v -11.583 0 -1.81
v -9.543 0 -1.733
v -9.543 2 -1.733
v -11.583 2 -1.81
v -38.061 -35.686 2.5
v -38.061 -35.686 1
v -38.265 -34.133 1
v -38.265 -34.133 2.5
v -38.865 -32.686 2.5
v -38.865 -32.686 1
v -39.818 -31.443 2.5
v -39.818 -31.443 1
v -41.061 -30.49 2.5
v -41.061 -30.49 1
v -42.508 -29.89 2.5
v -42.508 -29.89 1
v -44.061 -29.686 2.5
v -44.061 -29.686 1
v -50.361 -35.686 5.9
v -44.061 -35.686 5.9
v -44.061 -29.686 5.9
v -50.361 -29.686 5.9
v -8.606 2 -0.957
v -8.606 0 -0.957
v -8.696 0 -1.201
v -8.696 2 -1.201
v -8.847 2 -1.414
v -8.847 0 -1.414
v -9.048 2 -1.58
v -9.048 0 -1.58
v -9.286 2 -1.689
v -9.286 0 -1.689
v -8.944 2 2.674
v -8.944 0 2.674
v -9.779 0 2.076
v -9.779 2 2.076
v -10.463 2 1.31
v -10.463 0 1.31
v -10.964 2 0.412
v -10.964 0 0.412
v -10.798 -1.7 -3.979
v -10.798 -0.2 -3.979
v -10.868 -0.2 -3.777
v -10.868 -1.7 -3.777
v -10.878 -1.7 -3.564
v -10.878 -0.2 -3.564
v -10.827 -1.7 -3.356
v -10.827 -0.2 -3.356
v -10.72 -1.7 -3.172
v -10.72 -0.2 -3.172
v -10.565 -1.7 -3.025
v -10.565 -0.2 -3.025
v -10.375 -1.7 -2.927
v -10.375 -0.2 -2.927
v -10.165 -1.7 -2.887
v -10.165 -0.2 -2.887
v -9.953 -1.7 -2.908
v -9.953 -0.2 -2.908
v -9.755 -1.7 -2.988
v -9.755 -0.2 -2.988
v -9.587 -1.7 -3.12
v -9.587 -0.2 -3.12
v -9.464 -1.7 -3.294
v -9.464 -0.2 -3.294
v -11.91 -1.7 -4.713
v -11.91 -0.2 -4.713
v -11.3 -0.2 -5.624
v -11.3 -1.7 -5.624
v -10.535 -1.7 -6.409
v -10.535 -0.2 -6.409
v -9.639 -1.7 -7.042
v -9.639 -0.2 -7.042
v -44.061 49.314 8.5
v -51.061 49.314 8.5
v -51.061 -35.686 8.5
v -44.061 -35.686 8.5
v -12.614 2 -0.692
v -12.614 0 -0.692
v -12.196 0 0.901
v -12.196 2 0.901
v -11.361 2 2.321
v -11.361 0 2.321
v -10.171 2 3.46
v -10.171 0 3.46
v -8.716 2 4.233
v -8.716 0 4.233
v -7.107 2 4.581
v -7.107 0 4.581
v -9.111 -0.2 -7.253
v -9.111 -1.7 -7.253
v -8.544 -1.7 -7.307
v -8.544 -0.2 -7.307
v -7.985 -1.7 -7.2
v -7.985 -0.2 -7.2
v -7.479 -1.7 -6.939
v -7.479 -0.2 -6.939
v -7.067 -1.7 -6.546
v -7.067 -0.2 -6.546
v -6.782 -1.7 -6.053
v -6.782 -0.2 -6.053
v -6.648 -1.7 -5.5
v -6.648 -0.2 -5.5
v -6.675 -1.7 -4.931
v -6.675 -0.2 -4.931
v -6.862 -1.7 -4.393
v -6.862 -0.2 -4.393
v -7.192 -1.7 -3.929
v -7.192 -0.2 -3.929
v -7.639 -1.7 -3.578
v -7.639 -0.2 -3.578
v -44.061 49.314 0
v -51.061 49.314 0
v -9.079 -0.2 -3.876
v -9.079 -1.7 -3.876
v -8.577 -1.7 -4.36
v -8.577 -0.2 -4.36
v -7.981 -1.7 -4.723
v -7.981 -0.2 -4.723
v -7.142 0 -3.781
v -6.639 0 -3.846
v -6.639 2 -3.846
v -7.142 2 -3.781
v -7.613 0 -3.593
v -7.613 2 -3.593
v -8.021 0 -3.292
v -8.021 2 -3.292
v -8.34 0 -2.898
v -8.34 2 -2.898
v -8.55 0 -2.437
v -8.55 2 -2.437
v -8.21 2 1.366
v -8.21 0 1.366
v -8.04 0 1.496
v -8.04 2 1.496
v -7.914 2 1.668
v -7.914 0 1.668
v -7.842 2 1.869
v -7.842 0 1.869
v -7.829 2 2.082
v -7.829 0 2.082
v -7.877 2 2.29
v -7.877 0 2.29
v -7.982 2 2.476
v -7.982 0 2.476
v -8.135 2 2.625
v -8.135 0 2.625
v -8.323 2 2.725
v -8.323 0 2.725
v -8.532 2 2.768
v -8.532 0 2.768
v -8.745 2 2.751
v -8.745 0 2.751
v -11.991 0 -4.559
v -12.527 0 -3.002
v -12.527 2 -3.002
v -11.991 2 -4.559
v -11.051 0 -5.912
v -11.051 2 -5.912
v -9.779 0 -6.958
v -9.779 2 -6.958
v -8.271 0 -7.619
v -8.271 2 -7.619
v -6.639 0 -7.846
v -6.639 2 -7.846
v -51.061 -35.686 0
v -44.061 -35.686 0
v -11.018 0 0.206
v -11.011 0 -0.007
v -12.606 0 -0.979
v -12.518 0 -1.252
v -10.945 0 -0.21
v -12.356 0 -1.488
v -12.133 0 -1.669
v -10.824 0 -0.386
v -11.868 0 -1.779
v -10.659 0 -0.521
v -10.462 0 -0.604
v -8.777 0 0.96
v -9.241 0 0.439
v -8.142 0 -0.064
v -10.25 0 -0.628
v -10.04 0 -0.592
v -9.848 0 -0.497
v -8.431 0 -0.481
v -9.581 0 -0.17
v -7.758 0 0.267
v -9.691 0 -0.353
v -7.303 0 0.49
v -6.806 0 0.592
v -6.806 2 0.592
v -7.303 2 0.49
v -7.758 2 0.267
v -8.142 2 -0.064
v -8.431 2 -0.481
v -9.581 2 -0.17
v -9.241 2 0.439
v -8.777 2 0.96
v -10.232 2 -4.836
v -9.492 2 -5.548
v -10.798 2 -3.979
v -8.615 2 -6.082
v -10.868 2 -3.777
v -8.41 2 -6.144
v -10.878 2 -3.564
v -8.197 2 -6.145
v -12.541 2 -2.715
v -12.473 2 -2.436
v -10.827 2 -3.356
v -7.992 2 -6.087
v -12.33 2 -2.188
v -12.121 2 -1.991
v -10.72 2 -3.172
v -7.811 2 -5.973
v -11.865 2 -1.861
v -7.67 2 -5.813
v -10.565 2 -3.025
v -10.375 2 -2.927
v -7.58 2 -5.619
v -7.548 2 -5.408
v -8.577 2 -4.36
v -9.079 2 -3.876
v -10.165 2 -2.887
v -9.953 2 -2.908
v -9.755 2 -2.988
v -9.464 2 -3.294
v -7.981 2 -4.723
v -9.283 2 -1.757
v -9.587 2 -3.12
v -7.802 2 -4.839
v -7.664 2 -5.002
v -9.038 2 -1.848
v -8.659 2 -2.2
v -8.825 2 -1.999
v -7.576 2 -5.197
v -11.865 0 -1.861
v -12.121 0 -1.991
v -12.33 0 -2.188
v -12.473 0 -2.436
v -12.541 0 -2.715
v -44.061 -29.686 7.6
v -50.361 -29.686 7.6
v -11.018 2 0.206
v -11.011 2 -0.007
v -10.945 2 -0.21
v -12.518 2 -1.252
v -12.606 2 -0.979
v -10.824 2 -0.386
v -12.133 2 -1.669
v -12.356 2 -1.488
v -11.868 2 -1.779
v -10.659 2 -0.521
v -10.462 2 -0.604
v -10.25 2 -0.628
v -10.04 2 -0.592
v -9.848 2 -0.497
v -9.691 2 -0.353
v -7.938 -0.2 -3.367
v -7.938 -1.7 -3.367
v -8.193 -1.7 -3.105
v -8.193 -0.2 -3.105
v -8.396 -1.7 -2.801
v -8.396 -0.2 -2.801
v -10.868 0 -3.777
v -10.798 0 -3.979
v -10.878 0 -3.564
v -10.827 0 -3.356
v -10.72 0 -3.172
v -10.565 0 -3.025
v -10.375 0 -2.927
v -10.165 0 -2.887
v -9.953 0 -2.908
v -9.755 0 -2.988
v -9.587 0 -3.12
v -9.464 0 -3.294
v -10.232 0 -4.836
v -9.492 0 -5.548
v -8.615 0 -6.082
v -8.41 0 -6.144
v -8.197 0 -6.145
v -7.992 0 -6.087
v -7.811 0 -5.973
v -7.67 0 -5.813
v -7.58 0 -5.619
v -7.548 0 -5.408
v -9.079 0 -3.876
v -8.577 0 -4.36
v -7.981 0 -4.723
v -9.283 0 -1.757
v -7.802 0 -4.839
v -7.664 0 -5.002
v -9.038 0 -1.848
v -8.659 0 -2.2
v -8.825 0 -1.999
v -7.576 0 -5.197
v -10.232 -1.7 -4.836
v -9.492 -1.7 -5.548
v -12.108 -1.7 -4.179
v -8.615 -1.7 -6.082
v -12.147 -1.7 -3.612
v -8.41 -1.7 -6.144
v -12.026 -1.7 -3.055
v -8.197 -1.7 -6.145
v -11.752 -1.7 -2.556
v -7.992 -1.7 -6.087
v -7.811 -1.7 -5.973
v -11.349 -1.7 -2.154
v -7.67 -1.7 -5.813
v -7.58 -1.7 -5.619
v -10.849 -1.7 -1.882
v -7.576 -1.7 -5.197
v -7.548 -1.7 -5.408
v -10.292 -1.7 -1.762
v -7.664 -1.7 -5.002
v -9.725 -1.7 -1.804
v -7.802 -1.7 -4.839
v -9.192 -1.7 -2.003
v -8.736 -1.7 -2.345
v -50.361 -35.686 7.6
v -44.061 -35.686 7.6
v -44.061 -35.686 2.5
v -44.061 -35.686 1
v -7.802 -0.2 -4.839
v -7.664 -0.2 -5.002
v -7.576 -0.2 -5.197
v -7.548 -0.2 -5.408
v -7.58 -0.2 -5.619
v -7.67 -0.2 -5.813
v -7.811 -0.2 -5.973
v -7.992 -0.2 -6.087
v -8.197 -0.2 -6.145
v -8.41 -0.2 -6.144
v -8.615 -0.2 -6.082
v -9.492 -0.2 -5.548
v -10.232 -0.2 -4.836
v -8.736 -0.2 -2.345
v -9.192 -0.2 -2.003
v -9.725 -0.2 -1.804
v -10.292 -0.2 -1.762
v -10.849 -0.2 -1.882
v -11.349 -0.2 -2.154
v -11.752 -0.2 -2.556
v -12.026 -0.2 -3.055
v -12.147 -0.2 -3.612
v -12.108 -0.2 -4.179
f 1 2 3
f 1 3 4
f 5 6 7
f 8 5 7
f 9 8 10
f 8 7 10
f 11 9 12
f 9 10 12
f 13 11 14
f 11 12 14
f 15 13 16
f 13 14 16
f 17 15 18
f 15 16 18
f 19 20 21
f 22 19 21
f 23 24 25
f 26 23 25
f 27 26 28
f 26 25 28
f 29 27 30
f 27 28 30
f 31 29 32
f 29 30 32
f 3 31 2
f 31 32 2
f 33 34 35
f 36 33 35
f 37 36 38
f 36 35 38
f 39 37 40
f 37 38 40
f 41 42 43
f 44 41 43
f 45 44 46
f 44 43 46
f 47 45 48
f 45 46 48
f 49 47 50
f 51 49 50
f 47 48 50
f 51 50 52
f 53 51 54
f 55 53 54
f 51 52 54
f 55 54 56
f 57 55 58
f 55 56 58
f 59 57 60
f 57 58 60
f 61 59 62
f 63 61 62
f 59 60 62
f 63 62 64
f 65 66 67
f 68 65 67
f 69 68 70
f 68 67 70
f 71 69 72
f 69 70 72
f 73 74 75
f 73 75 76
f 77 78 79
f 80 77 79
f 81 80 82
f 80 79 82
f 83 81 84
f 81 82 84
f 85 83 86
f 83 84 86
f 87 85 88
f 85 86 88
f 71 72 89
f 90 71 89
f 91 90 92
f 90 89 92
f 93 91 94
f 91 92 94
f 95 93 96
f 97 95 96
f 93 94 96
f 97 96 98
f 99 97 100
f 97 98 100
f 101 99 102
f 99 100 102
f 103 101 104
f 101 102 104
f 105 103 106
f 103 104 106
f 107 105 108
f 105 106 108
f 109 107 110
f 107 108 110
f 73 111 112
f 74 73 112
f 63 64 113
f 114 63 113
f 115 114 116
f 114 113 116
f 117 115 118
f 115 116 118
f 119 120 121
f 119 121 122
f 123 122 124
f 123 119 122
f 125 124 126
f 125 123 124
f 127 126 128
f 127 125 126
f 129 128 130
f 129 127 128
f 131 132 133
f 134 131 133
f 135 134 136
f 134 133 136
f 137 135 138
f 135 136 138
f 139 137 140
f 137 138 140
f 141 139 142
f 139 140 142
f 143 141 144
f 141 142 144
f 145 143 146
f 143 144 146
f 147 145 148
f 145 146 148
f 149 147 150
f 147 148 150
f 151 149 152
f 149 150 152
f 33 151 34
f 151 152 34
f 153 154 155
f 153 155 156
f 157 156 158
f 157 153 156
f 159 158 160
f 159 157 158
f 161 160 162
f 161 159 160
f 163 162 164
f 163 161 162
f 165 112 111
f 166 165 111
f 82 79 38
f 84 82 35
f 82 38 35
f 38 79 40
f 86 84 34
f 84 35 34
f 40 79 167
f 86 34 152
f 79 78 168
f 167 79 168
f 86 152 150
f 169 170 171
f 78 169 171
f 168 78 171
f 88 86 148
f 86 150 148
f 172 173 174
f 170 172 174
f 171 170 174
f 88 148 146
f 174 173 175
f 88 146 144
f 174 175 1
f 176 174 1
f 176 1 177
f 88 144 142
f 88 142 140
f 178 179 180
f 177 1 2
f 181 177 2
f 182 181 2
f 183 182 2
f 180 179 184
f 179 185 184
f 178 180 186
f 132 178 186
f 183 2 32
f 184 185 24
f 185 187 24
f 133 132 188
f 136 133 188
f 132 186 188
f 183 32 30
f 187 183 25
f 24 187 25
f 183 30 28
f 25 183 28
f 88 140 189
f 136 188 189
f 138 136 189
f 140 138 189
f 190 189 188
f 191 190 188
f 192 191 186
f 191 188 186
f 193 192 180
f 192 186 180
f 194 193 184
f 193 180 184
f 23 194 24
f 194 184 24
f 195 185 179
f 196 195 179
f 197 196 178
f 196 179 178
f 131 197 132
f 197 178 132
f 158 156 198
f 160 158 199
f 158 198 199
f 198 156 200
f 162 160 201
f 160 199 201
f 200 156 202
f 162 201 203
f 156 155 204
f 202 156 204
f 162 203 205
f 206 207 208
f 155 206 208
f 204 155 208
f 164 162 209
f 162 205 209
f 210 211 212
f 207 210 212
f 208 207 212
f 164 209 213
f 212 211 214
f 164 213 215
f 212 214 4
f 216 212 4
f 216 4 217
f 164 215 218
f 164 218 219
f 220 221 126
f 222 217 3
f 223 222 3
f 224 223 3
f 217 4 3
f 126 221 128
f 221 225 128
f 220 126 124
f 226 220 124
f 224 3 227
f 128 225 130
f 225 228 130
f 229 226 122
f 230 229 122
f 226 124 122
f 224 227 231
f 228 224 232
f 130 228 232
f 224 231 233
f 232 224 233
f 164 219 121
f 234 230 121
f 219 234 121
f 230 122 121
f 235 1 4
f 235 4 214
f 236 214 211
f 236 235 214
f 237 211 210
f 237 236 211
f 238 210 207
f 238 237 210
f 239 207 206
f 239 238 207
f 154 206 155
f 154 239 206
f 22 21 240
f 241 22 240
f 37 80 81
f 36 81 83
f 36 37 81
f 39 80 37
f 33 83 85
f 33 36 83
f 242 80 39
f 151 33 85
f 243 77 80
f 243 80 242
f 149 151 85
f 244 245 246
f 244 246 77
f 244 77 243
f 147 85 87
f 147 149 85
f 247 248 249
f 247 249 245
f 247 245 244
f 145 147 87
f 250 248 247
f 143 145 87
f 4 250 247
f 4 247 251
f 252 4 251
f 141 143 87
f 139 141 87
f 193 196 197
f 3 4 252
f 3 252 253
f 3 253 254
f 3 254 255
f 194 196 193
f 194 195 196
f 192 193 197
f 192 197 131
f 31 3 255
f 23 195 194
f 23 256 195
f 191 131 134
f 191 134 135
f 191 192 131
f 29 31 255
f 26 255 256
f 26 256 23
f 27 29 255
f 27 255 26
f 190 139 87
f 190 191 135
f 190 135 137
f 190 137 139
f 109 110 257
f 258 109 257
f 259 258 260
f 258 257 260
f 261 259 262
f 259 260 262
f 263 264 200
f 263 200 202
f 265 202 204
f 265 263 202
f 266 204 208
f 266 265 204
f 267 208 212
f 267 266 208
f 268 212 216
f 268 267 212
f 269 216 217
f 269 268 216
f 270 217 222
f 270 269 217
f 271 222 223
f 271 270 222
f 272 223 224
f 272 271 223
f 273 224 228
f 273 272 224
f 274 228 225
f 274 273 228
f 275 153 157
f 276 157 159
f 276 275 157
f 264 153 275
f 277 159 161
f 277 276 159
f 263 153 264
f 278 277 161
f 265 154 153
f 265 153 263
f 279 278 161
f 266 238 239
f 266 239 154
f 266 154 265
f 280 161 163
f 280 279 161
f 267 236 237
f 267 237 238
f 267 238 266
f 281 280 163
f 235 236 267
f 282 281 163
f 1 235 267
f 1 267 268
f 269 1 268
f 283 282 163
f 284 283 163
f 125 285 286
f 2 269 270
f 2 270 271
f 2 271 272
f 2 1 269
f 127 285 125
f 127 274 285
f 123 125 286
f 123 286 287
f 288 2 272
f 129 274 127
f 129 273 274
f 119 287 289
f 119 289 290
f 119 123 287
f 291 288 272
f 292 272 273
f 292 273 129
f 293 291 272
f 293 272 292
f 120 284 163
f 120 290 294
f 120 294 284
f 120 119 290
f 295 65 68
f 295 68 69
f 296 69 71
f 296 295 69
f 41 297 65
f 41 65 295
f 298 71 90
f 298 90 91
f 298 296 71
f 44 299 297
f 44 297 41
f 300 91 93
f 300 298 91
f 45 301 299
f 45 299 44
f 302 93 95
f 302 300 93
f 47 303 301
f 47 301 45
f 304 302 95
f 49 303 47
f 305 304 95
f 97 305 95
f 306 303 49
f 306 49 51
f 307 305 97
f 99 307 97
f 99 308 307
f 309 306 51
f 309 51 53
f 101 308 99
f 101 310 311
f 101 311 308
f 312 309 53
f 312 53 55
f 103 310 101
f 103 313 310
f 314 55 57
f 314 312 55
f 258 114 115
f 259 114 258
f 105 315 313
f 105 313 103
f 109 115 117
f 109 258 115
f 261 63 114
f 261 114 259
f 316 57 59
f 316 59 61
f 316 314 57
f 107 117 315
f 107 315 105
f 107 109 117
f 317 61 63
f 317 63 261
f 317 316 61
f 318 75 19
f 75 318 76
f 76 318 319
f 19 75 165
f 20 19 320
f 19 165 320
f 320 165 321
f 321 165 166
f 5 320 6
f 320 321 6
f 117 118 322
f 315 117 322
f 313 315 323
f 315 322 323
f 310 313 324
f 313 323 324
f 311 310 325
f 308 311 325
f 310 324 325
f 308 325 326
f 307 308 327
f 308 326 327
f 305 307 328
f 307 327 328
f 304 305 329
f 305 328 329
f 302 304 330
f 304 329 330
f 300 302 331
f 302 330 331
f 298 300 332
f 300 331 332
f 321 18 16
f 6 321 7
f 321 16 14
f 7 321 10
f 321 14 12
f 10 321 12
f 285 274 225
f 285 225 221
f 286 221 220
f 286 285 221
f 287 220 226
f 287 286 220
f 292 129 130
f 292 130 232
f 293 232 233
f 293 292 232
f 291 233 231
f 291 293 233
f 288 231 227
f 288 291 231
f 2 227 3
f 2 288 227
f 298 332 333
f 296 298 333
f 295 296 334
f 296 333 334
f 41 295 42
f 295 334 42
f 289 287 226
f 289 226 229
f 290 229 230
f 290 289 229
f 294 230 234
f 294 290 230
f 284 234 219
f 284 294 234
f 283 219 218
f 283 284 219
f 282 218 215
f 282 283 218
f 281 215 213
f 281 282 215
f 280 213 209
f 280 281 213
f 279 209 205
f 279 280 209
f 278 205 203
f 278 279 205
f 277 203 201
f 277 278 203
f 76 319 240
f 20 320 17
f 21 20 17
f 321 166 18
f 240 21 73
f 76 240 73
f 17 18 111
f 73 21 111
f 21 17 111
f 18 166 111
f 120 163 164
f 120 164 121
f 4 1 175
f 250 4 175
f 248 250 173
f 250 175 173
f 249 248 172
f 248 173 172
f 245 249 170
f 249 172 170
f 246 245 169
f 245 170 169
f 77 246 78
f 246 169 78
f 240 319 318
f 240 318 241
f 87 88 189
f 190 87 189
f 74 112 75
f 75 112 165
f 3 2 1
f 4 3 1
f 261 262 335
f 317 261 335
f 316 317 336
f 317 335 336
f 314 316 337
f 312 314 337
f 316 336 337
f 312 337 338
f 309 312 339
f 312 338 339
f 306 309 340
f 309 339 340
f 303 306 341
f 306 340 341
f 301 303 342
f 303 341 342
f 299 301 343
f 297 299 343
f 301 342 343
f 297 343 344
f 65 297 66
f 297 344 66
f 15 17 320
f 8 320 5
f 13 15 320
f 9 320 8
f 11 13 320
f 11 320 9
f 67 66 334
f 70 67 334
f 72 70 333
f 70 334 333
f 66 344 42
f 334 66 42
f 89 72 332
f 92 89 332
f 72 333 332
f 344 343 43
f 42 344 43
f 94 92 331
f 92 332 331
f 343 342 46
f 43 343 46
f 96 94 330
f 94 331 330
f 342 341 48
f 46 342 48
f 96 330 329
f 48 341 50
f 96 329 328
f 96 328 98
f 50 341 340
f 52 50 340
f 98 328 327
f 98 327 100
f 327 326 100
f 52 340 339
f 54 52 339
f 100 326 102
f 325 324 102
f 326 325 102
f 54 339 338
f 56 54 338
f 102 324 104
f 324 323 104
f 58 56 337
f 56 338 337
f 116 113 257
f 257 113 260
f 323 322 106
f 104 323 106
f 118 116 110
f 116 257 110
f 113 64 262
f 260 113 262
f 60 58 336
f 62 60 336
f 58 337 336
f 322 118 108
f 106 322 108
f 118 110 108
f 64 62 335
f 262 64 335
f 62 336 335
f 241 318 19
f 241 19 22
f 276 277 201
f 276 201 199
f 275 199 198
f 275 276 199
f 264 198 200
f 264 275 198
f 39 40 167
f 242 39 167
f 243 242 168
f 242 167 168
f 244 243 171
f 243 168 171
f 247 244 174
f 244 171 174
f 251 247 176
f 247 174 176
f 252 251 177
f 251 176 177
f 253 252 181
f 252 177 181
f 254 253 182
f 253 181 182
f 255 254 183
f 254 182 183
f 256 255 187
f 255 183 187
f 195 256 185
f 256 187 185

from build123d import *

# Parameters (mm, degrees)
F1_DEPTH  = 8.5
F4_DEPTH  = 1.5
F5_W      = 6
F5_H      = 1.7
F6_DEPTH  = 6.3
F8_DEPTH  = 2
F11_DEPTH = 1.5


with BuildPart() as f1:
    # F0 (on Top) → F1 (new body)
    with BuildSketch(Plane.XY):
        Polygon((-44.0608784556, 49.3143303692), (-51.0608784556, 49.3143303692), (-51.0608784556, -35.6856696308), (-44.0608784556, -35.6856696308), (-44.0608784556, -29.6856696308), align=None)
    extrude(amount=F1_DEPTH)

    # F3 (on offset) → F4 (join)
    with BuildSketch(Plane.XY.offset(1)):
        with BuildLine():
            ThreePointArc((-38.0608784556, -35.6856696308), (-39.8182377685, -31.4430289436), (-44.0608784556, -29.6856696308))
            Line((-44.0608784556, -29.6856696308), (-44.0608784556, -35.6856696308))
            Line((-44.0608784556, -35.6856696308), (-38.0608784556, -35.6856696308))
        make_face()
    extrude(amount=F4_DEPTH)

    # F5 (on face) → F6 (cut)
    with BuildSketch(Plane.YZ.offset(-44.0608784556)):
        with Locations((-32.6856696308, 6.75)):
            Rectangle(F5_W, F5_H)
    extrude(amount=-F6_DEPTH, mode=Mode.SUBTRACT)


with BuildPart() as f8:
    # F7 (on Front) → F8 (new body)
    with BuildSketch(Plane.XZ):
        with BuildLine():
            ThreePointArc((-11.5830838789, -1.8096130051), (-12.3295300446, -2.1881894299), (-12.5267582762, -3.001579258))
            ThreePointArc((-12.5267582762, -3.001579258), (-10.4512512978, -6.4789110558), (-6.6391801015, -7.8455415266))
            Line((-6.6391801015, -7.8455415266), (-6.6391801015, -3.8455415266))
            ThreePointArc((-6.6391801015, -3.8455415266), (-7.8261601413, -3.4552242235), (-8.5498413333, -2.4366199115))
            ThreePointArc((-8.5498413333, -2.4366199115), (-8.9269159095, -1.9163037538), (-9.542760581, -1.7328658064))
            Line((-9.542760581, -1.7328658064), (-11.5830838789, -1.8096130051))
        make_face()
        with BuildLine():
            ThreePointArc((-8.6146861663, -6.0820279542), (-9.8817958098, -5.2124221053), (-10.798416024, -3.9788952253))
            ThreePointArc((-10.798416024, -3.9788952253), (-10.4733696324, -2.9692691345), (-9.4637435416, -3.294315526))
            ThreePointArc((-9.4637435416, -3.294315526), (-8.8412609525, -4.1320114377), (-7.9807587737, -4.7225662736))
            ThreePointArc((-7.9807587737, -4.7225662736), (-7.6179916297, -5.7192608102), (-8.6146861663, -6.0820279542))
        make_face(mode=Mode.SUBTRACT)
    extrude(amount=-F8_DEPTH)


with BuildPart() as f11:
    # F10 (on offset) → F11 (new body)
    with BuildSketch(Plane.XZ.offset(0.2)):
        with BuildLine():
            ThreePointArc((-7.6391801015, -3.5775923341), (-8.0711782653, -3.2417439684), (-8.3959854459, -2.8013840772))
            ThreePointArc((-8.3959854459, -2.8013840772), (-11.1086333411, -2.0004212834), (-11.9095961349, -4.7130691785))
            ThreePointArc((-11.9095961349, -4.7130691785), (-10.9351745931, -6.0341488521), (-9.6391801015, -7.0416939493))
            ThreePointArc((-9.6391801015, -7.0416939493), (-6.9071292939, -6.3096431417), (-7.6391801015, -3.5775923341))
        make_face()
        with BuildLine():
            ThreePointArc((-9.4637435416, -3.294315526), (-8.8412609525, -4.1320114377), (-7.9807587737, -4.7225662736))
            ThreePointArc((-7.9807587737, -4.7225662736), (-7.6179916297, -5.7192608102), (-8.6146861663, -6.0820279542))
            ThreePointArc((-8.6146861663, -6.0820279542), (-9.8817958098, -5.2124221053), (-10.798416024, -3.9788952253))
            ThreePointArc((-10.798416024, -3.9788952253), (-10.4733696324, -2.9692691345), (-9.4637435416, -3.294315526))
        make_face(mode=Mode.SUBTRACT)
    extrude(amount=F11_DEPTH)


with BuildPart() as f12_1:
    # F12: instance of F8
    add(f8.part.mirror(Plane(origin=(-10.56292223, 1, -1.7712394057), x_dir=(1, 0, 0), z_dir=(-0.0375886318, 0, 0.9992932977))))


solid = Compound([f1.part, f8.part, f11.part, f12_1.part])
